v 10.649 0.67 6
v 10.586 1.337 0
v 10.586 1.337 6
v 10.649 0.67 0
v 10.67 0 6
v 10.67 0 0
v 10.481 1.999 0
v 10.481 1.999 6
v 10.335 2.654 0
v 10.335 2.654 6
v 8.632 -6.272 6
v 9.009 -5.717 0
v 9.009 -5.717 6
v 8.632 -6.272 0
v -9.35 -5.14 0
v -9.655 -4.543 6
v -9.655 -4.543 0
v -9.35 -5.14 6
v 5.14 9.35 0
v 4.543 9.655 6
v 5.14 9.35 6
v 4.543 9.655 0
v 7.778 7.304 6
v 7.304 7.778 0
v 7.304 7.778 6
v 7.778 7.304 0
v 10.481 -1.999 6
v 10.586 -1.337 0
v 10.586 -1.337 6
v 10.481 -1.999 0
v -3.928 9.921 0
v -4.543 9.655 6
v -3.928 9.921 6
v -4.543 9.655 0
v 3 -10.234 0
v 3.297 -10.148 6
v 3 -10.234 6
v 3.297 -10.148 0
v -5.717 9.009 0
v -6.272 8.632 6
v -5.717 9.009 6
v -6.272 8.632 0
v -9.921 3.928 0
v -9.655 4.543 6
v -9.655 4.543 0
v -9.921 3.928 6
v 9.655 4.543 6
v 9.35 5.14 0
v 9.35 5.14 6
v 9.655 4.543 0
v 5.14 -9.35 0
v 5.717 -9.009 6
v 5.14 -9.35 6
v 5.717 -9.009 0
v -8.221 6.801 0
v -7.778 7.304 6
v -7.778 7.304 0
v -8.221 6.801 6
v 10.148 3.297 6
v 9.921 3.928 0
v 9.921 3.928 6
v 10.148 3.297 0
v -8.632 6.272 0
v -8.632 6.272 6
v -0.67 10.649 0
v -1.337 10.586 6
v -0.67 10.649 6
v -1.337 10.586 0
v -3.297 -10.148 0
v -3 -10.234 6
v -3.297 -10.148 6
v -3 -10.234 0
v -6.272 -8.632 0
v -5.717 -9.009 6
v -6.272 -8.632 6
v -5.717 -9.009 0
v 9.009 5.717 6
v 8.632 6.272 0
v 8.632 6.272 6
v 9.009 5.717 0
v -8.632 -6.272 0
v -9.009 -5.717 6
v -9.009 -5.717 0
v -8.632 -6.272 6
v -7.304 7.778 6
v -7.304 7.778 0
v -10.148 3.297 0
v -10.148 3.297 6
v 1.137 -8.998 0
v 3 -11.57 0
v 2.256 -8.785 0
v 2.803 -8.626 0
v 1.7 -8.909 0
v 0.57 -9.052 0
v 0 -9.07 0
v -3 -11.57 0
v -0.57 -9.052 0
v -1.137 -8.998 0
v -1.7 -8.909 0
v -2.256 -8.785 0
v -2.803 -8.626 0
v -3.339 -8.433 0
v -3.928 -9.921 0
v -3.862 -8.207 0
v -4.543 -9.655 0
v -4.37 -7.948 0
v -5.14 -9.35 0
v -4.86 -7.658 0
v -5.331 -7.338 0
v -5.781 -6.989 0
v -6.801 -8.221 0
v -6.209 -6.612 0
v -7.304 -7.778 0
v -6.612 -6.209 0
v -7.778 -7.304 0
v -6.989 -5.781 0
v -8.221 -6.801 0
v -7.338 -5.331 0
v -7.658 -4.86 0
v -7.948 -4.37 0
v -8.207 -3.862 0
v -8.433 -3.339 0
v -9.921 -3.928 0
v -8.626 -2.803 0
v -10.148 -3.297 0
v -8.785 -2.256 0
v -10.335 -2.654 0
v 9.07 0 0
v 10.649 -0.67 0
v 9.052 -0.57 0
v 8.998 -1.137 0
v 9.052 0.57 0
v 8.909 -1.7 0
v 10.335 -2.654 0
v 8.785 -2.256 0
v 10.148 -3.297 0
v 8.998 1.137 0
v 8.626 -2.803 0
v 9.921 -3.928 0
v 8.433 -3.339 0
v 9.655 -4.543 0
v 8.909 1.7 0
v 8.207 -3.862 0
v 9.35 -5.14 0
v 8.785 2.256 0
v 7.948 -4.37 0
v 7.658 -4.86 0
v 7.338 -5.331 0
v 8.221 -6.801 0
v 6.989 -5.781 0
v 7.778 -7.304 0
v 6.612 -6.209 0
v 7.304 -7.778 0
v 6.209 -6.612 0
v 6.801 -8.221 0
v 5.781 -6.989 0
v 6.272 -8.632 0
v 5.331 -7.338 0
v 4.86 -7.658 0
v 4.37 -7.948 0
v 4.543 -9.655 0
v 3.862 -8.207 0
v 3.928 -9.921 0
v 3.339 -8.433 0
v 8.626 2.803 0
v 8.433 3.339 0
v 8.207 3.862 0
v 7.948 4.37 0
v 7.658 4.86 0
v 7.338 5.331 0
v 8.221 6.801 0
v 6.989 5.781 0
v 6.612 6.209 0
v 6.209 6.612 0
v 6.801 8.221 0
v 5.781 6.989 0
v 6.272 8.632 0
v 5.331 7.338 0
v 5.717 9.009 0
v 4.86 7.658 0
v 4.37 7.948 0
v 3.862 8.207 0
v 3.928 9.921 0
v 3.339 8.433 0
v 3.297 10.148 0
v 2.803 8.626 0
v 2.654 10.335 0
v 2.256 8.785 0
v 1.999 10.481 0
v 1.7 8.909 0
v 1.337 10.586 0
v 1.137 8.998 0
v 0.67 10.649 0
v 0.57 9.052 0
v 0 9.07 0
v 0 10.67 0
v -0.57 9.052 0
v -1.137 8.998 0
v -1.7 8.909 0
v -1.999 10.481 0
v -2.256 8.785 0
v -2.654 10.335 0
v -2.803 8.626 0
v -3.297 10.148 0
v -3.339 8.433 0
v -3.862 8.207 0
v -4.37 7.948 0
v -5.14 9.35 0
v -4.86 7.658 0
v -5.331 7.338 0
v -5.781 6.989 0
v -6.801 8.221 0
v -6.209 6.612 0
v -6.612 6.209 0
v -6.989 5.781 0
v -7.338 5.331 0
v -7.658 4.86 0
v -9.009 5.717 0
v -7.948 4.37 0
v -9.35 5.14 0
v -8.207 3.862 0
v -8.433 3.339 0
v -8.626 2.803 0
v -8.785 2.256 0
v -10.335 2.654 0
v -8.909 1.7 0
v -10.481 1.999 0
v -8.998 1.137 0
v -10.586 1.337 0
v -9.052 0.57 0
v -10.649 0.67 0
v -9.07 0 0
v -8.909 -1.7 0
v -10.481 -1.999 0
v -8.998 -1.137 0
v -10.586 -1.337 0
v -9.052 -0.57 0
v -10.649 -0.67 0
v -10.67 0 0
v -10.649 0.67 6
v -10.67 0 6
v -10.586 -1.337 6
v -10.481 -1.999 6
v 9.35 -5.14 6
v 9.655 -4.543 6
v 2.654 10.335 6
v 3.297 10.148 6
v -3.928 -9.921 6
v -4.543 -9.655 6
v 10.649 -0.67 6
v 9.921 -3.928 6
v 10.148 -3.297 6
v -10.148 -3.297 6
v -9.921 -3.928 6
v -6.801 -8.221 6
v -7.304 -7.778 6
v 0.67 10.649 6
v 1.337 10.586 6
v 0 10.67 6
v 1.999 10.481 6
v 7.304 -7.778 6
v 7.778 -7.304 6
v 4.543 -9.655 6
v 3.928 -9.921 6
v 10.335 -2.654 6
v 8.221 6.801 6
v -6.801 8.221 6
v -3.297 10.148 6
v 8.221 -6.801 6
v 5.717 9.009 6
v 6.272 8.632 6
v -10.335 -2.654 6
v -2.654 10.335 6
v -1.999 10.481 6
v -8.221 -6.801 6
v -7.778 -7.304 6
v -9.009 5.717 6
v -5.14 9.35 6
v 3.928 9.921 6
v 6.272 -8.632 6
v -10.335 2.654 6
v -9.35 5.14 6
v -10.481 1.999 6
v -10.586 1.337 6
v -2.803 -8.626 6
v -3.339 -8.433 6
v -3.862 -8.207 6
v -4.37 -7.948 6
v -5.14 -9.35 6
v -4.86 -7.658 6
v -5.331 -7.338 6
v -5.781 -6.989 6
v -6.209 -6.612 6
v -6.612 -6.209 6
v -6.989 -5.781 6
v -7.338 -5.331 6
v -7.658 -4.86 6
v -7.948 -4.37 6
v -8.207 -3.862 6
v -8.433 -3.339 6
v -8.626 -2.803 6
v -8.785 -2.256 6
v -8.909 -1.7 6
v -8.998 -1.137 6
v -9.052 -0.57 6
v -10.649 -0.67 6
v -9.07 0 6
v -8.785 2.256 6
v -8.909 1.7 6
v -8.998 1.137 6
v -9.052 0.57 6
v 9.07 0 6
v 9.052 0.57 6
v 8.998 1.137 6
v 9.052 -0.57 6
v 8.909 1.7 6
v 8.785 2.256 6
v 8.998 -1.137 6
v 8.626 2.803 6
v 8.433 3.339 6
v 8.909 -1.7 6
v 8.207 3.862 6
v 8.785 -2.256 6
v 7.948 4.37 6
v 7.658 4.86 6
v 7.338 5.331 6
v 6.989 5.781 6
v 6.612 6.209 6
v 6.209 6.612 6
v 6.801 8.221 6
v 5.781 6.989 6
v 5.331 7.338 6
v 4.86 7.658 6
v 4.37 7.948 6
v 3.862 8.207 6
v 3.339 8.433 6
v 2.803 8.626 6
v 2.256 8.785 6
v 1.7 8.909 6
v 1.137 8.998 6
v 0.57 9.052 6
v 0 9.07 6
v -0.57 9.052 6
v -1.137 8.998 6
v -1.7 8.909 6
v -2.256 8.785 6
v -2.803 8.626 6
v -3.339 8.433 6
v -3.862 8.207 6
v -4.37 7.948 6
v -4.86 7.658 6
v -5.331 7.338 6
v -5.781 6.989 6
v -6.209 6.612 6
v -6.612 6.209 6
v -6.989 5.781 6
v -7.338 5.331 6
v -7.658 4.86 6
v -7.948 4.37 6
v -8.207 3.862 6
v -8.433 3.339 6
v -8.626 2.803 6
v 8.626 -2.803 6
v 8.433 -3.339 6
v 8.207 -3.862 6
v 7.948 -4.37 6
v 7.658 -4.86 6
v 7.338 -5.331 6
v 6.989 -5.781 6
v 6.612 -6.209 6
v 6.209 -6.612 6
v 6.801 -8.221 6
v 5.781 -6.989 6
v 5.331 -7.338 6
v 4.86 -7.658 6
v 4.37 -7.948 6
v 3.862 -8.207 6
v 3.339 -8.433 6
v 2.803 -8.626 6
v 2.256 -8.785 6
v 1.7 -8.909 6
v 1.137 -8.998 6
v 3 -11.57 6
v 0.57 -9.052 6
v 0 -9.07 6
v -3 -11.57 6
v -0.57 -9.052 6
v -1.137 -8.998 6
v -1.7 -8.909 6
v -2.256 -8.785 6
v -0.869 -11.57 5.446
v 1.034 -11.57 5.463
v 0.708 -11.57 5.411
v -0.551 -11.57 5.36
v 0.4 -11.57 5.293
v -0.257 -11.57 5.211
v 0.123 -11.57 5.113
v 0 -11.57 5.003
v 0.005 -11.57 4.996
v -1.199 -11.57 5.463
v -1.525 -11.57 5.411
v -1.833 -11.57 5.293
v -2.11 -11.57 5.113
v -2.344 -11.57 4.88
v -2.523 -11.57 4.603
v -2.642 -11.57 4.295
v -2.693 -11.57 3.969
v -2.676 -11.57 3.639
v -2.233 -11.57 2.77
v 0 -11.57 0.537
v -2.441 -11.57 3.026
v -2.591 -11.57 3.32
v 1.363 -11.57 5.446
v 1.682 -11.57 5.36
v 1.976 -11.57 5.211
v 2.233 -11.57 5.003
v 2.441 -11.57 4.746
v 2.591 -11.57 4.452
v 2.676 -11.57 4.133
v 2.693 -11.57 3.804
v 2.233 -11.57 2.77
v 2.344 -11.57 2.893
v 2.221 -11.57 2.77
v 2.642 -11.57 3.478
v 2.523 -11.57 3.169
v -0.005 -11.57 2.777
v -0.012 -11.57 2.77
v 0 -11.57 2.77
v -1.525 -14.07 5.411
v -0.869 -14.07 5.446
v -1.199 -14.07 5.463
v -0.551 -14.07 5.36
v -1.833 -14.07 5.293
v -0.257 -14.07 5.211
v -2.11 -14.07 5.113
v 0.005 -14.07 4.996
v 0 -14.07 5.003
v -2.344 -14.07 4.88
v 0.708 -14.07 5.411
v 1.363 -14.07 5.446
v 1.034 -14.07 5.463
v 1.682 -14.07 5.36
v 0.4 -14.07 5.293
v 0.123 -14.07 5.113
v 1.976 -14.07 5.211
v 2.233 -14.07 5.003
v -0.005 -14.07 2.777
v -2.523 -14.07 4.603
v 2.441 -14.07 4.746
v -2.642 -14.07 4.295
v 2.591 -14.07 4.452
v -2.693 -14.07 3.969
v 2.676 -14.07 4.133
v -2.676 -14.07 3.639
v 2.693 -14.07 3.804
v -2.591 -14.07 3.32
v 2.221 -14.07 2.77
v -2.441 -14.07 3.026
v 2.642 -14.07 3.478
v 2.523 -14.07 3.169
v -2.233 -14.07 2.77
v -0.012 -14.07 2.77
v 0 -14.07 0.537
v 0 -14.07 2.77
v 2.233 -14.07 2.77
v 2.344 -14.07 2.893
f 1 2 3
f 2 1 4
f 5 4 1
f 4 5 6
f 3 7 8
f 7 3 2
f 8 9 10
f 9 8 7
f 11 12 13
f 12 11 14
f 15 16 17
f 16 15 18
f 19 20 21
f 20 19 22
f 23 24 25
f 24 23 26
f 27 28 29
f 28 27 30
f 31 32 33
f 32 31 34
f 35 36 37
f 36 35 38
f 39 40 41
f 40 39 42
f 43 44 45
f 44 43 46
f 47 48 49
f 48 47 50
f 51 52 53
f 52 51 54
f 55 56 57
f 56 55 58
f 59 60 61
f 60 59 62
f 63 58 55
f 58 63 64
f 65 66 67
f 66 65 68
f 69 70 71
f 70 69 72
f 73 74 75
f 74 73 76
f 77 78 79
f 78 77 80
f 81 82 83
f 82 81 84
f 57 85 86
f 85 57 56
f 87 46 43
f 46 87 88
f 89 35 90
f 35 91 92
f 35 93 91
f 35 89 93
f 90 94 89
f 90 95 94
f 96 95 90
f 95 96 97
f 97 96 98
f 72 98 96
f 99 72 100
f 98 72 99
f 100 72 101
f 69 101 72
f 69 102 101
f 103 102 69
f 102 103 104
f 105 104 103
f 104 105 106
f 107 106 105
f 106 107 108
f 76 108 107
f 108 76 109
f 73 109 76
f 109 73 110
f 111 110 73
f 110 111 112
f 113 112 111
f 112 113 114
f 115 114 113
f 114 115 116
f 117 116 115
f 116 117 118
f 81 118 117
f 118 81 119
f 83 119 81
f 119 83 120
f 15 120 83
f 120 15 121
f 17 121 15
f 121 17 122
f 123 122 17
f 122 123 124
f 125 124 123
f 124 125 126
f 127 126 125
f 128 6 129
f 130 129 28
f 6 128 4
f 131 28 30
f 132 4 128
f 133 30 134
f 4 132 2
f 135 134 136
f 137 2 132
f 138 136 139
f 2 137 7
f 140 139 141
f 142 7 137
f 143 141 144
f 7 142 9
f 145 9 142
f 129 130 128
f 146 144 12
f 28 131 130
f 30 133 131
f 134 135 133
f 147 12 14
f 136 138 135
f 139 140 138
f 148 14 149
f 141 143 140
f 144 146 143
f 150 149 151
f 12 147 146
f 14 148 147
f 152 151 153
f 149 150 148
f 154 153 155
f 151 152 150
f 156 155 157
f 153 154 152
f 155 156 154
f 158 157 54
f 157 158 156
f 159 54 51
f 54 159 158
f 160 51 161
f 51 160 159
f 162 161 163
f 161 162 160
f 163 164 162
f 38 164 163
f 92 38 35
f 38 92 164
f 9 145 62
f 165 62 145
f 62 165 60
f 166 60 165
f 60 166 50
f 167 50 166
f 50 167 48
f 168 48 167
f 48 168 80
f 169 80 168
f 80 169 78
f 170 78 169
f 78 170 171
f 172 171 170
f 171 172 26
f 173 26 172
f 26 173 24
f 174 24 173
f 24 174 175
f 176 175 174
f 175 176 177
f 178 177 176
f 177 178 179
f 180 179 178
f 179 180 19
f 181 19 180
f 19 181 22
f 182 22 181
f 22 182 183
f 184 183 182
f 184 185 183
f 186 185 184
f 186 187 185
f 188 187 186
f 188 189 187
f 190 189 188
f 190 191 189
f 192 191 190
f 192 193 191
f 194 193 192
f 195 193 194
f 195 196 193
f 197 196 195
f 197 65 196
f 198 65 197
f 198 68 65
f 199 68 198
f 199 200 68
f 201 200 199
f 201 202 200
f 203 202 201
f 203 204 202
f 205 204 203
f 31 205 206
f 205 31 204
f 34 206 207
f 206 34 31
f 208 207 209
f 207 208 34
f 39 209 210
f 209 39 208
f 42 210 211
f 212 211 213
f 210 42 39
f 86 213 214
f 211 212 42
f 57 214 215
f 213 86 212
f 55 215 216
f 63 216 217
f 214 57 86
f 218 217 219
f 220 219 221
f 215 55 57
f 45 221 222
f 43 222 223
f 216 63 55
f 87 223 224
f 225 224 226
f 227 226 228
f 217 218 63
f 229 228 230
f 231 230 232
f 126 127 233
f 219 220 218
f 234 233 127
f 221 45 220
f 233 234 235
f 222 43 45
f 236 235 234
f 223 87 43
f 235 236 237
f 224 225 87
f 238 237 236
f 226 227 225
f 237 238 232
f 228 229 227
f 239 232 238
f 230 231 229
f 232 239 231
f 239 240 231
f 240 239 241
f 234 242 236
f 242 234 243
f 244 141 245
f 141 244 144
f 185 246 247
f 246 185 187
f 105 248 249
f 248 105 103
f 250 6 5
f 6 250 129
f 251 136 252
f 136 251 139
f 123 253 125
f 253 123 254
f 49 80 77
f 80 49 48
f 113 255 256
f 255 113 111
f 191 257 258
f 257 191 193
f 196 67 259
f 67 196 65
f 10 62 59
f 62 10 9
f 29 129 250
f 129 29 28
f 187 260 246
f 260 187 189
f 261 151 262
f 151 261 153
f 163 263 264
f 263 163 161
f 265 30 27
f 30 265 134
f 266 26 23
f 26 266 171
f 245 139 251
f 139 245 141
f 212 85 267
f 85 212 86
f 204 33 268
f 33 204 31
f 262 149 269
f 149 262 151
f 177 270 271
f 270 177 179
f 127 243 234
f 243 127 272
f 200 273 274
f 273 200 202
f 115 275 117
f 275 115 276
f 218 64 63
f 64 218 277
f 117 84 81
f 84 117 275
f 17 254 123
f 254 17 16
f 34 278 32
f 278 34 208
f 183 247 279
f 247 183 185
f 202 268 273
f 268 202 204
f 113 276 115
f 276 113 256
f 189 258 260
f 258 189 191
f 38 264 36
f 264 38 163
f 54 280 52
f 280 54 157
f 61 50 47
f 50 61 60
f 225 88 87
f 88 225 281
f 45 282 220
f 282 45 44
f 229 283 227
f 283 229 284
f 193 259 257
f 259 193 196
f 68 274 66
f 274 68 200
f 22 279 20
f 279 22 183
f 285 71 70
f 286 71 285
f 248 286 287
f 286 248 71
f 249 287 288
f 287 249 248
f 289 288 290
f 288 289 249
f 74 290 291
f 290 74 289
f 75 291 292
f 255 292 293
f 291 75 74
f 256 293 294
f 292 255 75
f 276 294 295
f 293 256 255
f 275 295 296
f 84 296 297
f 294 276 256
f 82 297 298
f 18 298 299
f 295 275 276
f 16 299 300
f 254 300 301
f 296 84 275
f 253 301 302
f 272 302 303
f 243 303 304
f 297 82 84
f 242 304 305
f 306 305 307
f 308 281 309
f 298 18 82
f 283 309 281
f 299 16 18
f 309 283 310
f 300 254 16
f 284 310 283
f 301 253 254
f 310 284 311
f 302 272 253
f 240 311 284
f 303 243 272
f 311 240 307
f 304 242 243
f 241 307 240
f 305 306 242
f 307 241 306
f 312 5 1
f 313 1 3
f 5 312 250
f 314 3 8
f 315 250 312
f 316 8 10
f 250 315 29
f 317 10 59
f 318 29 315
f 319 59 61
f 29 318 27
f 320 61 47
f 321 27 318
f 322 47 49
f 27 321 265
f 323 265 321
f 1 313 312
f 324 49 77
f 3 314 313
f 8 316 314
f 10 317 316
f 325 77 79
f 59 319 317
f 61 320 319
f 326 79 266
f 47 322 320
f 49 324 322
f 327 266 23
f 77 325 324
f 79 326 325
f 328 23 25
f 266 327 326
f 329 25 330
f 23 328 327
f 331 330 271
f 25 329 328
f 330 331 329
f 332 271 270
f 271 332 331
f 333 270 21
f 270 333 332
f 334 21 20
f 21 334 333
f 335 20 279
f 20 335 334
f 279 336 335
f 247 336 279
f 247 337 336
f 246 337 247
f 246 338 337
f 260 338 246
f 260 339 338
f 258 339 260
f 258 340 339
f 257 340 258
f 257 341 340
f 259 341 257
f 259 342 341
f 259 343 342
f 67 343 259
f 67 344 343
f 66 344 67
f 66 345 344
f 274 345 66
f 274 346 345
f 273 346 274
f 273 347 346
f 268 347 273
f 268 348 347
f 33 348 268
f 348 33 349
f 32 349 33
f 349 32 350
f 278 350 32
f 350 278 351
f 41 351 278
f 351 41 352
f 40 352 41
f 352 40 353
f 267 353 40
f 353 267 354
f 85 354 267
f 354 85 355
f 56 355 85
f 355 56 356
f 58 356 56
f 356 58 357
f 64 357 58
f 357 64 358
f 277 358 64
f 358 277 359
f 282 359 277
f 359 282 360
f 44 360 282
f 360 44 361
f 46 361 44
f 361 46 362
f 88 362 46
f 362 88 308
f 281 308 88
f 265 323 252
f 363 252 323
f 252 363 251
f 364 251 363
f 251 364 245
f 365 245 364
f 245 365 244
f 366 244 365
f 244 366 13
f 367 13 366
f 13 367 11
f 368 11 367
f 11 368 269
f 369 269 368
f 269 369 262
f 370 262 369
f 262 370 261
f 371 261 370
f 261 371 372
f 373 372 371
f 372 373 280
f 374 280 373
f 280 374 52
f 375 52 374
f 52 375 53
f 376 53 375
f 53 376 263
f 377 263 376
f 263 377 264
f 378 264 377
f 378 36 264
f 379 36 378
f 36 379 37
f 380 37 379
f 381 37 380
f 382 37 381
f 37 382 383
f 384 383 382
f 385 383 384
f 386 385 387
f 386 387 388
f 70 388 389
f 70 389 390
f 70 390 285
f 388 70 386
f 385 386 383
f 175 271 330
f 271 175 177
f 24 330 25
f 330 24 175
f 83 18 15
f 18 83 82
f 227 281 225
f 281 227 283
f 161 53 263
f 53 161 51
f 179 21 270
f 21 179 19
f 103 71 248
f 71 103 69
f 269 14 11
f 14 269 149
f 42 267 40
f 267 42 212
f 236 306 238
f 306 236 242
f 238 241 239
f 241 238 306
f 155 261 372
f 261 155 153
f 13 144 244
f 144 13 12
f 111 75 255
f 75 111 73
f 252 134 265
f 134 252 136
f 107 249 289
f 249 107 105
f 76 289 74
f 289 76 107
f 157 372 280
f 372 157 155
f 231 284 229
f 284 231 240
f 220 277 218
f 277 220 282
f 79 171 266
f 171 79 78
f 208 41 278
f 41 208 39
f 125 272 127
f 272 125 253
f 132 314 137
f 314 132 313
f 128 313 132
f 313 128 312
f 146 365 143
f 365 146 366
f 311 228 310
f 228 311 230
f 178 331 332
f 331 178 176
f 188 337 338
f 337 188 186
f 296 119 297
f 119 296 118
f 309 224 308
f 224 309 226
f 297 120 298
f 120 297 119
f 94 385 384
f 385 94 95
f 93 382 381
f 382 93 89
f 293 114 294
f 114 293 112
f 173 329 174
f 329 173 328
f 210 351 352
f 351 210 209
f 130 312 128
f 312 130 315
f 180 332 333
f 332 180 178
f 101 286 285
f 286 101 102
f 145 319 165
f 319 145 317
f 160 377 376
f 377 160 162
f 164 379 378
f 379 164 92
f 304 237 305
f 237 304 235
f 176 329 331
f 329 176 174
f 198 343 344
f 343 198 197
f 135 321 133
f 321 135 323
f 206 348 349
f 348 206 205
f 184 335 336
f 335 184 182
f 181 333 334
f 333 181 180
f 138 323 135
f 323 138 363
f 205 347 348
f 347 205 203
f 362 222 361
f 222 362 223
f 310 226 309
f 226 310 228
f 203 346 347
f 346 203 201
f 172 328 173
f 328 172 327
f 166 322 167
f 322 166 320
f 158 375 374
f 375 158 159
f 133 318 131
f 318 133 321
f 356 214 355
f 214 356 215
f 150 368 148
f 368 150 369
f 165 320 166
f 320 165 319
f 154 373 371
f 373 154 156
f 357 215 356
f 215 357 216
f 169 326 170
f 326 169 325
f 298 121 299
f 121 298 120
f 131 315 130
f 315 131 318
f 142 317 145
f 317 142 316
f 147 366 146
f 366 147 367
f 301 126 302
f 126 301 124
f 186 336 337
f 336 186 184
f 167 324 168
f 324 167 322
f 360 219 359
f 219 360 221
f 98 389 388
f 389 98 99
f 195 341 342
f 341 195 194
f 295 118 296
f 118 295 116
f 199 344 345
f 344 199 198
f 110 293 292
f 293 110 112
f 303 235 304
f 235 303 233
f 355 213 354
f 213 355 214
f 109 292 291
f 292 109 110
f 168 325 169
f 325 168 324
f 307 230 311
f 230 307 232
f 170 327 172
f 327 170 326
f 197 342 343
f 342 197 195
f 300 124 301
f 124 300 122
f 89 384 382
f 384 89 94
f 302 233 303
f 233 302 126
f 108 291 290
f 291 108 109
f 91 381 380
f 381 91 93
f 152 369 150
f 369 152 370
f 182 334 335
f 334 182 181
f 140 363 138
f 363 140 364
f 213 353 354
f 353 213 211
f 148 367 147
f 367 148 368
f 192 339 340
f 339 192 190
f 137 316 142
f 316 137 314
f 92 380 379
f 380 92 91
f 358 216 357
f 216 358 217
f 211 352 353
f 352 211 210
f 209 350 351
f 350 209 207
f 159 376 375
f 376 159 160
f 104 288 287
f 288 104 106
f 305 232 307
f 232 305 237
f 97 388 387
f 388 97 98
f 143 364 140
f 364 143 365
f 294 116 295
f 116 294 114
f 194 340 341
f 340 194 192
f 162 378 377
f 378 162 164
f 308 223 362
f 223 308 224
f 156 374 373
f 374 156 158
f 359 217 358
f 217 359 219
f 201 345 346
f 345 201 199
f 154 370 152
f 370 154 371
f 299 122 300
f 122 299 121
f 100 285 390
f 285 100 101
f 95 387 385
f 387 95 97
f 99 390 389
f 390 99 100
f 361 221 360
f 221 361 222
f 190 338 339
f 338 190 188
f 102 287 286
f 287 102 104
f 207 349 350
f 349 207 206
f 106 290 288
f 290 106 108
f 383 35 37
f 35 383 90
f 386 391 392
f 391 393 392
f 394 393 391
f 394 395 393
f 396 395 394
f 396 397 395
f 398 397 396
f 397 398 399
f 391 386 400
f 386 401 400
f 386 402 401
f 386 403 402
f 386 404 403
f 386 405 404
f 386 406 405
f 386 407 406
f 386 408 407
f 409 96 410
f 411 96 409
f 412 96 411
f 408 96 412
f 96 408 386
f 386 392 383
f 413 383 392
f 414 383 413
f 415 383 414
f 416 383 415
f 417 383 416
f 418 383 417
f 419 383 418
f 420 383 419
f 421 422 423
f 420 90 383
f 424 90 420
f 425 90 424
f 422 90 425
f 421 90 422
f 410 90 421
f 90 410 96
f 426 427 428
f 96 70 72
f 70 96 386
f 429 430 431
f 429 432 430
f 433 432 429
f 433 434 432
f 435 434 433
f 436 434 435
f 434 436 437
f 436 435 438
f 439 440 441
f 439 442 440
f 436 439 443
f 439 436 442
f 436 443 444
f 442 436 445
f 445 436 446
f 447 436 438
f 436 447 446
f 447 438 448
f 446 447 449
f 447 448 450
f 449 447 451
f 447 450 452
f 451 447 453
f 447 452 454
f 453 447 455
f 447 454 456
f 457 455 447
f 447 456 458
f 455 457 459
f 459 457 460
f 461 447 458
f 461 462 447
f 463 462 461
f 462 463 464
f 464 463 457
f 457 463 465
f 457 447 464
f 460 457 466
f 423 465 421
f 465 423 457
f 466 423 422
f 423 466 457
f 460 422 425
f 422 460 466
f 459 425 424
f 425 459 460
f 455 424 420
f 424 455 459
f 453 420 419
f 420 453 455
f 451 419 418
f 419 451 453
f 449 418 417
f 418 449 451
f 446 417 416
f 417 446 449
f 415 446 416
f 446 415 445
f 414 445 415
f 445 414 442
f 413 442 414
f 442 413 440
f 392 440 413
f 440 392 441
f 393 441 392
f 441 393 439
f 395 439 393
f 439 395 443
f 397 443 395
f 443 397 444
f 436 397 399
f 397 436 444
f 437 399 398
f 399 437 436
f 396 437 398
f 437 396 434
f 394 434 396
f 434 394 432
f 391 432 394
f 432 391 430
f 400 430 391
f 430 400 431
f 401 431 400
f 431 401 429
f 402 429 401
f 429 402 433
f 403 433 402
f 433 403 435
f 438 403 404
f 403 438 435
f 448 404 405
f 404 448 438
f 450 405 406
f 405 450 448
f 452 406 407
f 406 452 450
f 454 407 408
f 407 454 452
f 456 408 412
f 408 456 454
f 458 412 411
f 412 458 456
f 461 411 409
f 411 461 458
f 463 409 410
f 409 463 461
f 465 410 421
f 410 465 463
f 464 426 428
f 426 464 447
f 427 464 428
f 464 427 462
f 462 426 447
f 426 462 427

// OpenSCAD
// [FL_INDEX: keywords="openscad, 3d_parametric, Matching_Ring, csg_solid" | COT="Parametric OpenSCAD design from 3DCodeverse"]
// Title: Matching Ring

//For Matching Ring, Please use same Ring Width
//But you can select different ring size for each one

//CUSTOMIZER VARIABLES
ring_type = 1;//[0:Male,1:Female]

//(US Ring Sizes)
ring_size = 18.14;//[11.63:0,11.84:0.25,12.04:0.5,12.24:0.75,12.45:1,12.65:1.25,12.85:1.5,13.06:1.75,13.26:2,13.46:2.25,13.67:2.5,13.87:2.75,14.07:3,14.27:3.25,14.48:3.5,14.68:3.75,14.88:4,15.09:4.25,15.29:4.5,15.49:4.75,2215.9:5.25,16.1:5.5,16.31:5.75,16.51:6,16.71:6.25,16.92:6.5,17.12:6.75,17.32:7,17.53:7.25,17.73:7.5,17.93:7.75,18.14:8,18.34:8.25,18.54:8.5,18.75:8.75,18.95:9,19.15:9.25,19.35:9.5,19.56:9.75,19.76:10,19.96:10.25,20.17:10.5,20.37:10.75,20.57:11,20.78:11.25,20.98:11.5,21.18:11.75,21.39:12,21.59:12.25,21.79:12.5,22:12.75,22.2:13,22.4:13.25,22.61:13.5,22.81:13.75,23.01:14,23.22:14.25,23.42:14.5,23.62:14.75,23.83:15,24.03:15.25,24.23:15.5,24.43:15.75,24.64:16]

ring_thickness = 1.6;//[1.6:Normal,2.4:Thick]

ring_width = 6;//[6:12]

ring_top_high = 5;//[4:8]

//CUSTOMIZER VARIABLES END
inner_radius = ring_size/2;

translate ([0,0,ring_width/2])
union () {
ring();
translate ([0,-inner_radius,0])
rotate(a=90,v=[1,0,0])

if(ring_type == 0){
	ringtop1 (ring_width,ring_top_high);
} else {
	ringtop2 (ring_width,ring_top_high);
}
}

module ring() {

difference() {
			cylinder(r=inner_radius+ring_thickness,h=ring_width,$fn = 100,center = true);
			cylinder(r=inner_radius,h=ring_width+1,$fn = 100,center = true);
}

}

module heart (w,h) {
scale (v=[w/171,w/171,1])
translate([0,-78,0])
rotate (a=45, v=[0,0,1])
linear_extrude(height = h,convexity =10, twist =0 ) {
polygon(points=[[0,0],[100,0],[0,100]], paths=[[0,1,2]]);
translate([100,50,0])
circle(r=50);
translate([50,100,0])
circle(r=50);
}
}

module ringtop1 (w,h) {
difference() {
translate ([-w/2,-w/2,0])
cube (size=[w,w,h]);
translate ([0,0,h*0.5])
heart (w*0.9+0.3,h*0.5);
}
}

module ringtop2 (w,h) {
union() {
translate ([-w/2,-w/2,0])
cube (size=[w,w,h*.5]);
heart (w*0.9,h);
}
}
